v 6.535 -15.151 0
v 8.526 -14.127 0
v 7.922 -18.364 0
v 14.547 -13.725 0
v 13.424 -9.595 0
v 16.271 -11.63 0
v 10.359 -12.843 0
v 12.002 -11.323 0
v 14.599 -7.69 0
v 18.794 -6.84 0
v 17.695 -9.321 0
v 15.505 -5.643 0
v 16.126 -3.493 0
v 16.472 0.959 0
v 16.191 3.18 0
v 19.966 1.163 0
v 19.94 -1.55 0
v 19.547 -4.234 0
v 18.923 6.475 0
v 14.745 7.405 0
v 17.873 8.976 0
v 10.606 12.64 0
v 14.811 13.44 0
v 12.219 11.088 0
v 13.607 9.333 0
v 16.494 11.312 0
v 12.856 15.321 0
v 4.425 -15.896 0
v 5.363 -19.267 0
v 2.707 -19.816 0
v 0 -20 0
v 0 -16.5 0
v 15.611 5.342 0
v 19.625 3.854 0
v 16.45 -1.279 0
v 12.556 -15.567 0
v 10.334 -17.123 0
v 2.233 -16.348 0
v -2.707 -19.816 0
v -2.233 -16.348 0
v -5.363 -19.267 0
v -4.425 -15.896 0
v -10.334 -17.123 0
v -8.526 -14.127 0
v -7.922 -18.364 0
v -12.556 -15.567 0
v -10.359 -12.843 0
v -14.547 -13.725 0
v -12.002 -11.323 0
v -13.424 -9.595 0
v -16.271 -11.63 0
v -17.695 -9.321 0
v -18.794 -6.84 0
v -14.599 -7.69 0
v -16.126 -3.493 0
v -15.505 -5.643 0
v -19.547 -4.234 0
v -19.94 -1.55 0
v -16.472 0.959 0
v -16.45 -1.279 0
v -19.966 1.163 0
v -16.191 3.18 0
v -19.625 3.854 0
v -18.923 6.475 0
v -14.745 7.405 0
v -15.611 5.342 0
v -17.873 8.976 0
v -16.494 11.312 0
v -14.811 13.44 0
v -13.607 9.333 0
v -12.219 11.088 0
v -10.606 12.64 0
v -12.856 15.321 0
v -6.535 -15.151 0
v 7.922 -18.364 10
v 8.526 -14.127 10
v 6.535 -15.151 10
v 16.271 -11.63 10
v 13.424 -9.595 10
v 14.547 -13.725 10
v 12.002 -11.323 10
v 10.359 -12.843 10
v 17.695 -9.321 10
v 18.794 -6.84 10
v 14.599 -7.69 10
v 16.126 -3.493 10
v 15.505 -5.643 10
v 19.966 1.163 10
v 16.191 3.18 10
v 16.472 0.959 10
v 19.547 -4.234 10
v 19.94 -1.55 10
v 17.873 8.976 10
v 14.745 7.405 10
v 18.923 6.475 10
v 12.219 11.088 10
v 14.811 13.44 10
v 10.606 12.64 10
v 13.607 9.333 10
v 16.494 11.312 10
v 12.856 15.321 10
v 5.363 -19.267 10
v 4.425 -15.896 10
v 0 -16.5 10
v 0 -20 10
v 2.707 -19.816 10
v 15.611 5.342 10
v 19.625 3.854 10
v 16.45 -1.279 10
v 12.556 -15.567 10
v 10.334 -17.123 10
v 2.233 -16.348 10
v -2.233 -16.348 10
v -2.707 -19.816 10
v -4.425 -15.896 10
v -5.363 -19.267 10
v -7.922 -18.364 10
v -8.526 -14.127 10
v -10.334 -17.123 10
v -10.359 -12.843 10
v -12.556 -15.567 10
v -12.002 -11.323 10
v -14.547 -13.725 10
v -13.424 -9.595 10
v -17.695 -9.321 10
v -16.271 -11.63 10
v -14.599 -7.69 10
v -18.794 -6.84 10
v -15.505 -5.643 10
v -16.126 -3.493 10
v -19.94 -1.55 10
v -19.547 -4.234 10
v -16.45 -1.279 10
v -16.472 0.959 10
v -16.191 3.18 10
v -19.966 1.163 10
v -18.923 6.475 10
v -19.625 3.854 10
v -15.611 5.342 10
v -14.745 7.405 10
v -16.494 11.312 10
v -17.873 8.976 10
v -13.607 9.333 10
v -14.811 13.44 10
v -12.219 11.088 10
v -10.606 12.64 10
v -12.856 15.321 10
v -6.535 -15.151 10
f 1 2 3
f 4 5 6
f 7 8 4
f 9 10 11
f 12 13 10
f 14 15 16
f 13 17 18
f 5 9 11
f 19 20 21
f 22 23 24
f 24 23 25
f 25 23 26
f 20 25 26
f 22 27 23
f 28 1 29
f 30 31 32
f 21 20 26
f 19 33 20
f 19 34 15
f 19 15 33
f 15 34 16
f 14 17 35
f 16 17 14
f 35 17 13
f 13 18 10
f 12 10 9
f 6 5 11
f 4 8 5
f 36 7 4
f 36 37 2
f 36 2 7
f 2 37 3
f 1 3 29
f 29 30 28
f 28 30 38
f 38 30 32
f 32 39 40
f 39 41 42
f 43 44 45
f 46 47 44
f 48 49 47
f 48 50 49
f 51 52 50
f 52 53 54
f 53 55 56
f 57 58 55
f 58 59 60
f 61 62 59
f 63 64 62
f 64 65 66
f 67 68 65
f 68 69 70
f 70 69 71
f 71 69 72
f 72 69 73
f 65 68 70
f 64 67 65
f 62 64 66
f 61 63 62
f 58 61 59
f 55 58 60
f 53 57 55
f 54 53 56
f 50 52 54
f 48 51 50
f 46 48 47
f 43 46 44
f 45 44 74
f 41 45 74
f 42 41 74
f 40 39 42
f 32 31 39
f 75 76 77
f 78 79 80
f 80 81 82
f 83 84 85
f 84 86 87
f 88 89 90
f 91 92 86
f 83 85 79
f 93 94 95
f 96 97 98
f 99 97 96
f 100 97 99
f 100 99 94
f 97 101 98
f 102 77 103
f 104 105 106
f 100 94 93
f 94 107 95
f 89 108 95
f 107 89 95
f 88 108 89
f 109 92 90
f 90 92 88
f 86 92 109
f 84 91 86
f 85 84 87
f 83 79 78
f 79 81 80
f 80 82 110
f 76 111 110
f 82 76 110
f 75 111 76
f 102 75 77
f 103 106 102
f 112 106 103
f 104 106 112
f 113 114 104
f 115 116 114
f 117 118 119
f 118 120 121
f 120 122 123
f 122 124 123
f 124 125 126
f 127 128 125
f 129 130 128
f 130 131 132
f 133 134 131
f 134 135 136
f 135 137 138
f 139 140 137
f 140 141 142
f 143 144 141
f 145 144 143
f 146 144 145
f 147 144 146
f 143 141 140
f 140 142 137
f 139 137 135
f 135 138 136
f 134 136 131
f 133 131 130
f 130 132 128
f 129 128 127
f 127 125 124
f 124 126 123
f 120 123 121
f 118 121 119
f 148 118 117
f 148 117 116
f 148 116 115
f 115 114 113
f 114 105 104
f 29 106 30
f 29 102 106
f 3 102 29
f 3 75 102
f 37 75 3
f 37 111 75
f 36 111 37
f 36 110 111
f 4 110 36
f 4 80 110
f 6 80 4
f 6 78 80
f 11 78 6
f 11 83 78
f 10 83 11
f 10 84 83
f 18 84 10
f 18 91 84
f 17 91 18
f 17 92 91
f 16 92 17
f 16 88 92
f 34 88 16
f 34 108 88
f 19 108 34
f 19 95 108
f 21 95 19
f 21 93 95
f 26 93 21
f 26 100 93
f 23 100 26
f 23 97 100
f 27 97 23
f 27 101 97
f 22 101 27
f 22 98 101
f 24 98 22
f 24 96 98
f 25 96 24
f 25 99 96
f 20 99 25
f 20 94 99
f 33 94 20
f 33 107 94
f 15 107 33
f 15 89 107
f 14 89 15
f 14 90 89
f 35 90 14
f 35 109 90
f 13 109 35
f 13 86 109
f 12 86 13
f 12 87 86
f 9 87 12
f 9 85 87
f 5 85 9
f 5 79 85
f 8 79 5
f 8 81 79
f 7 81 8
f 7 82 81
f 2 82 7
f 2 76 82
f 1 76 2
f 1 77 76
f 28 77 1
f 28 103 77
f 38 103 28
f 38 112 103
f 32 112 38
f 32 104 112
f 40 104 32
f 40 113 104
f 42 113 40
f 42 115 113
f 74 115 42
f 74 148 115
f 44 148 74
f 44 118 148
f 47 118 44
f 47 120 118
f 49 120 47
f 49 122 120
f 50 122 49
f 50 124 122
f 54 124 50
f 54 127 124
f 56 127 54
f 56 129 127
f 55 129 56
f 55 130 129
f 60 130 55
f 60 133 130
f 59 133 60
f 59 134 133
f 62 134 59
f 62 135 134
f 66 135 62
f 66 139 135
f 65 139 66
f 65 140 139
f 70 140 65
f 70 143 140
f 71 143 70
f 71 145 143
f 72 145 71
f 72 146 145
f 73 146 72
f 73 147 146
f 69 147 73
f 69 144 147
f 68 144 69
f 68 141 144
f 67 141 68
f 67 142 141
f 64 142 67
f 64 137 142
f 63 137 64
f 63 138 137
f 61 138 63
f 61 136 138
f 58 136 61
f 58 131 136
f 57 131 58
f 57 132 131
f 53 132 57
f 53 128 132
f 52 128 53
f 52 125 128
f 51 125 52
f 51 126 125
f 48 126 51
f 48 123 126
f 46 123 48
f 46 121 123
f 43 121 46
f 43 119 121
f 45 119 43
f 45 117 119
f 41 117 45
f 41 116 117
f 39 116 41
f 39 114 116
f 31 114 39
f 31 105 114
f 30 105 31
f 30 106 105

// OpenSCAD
$fn = 32;

// ----------------------------------------------------------------------
// Spring clip: 40 mm outside, 3.5 mm band, 80 degree opening
// ----------------------------------------------------------------------

// --- parameters (mm) ---
outer_r = 20;             // clip outside radius
inner_r = 16.5;           // clip bore radius
band = 3.5;               // band thickness
clip_w = 10;              // clip width
opening = 80;             // opening angle

clip_profile = [[-12.856, 15.321], [-14.811, 13.44], [-16.494, 11.312], [-17.873, 8.976], [-18.923, 6.475], [-19.625, 3.854], [-19.966, 1.163], [-19.94, -1.55], [-19.547, -4.234], [-18.794, -6.84], [-17.695, -9.321], [-16.271, -11.63], [-14.547, -13.725], [-12.556, -15.567], [-10.334, -17.123], [-7.922, -18.364], [-5.363, -19.267], [-2.707, -19.816], [0, -20], [2.707, -19.816], [5.363, -19.267], [7.922, -18.364], [10.334, -17.123], [12.556, -15.567], [14.547, -13.725], [16.271, -11.63], [17.695, -9.321], [18.794, -6.84], [19.547, -4.234], [19.94, -1.55], [19.966, 1.163], [19.625, 3.854], [18.923, 6.475], [17.873, 8.976], [16.494, 11.312], [14.811, 13.44], [12.856, 15.321], [10.606, 12.64], [12.219, 11.088], [13.607, 9.333], [14.745, 7.405], [15.611, 5.342], [16.191, 3.18], [16.472, 0.959], [16.45, -1.279], [16.126, -3.493], [15.505, -5.643], [14.599, -7.69], [13.424, -9.595], [12.002, -11.323], [10.359, -12.843], [8.526, -14.127], [6.535, -15.151], [4.425, -15.896], [2.233, -16.348], [0, -16.5], [-2.233, -16.348], [-4.425, -15.896], [-6.535, -15.151], [-8.526, -14.127], [-10.359, -12.843], [-12.002, -11.323], [-13.424, -9.595], [-14.599, -7.69], [-15.505, -5.643], [-16.126, -3.493], [-16.45, -1.279], [-16.472, 0.959], [-16.191, 3.18], [-15.611, 5.342], [-14.745, 7.405], [-13.607, 9.333], [-12.219, 11.088], [-10.606, 12.64]];

difference() {
  union() {
    linear_extrude(height = clip_w) polygon(clip_profile);
  }
}
